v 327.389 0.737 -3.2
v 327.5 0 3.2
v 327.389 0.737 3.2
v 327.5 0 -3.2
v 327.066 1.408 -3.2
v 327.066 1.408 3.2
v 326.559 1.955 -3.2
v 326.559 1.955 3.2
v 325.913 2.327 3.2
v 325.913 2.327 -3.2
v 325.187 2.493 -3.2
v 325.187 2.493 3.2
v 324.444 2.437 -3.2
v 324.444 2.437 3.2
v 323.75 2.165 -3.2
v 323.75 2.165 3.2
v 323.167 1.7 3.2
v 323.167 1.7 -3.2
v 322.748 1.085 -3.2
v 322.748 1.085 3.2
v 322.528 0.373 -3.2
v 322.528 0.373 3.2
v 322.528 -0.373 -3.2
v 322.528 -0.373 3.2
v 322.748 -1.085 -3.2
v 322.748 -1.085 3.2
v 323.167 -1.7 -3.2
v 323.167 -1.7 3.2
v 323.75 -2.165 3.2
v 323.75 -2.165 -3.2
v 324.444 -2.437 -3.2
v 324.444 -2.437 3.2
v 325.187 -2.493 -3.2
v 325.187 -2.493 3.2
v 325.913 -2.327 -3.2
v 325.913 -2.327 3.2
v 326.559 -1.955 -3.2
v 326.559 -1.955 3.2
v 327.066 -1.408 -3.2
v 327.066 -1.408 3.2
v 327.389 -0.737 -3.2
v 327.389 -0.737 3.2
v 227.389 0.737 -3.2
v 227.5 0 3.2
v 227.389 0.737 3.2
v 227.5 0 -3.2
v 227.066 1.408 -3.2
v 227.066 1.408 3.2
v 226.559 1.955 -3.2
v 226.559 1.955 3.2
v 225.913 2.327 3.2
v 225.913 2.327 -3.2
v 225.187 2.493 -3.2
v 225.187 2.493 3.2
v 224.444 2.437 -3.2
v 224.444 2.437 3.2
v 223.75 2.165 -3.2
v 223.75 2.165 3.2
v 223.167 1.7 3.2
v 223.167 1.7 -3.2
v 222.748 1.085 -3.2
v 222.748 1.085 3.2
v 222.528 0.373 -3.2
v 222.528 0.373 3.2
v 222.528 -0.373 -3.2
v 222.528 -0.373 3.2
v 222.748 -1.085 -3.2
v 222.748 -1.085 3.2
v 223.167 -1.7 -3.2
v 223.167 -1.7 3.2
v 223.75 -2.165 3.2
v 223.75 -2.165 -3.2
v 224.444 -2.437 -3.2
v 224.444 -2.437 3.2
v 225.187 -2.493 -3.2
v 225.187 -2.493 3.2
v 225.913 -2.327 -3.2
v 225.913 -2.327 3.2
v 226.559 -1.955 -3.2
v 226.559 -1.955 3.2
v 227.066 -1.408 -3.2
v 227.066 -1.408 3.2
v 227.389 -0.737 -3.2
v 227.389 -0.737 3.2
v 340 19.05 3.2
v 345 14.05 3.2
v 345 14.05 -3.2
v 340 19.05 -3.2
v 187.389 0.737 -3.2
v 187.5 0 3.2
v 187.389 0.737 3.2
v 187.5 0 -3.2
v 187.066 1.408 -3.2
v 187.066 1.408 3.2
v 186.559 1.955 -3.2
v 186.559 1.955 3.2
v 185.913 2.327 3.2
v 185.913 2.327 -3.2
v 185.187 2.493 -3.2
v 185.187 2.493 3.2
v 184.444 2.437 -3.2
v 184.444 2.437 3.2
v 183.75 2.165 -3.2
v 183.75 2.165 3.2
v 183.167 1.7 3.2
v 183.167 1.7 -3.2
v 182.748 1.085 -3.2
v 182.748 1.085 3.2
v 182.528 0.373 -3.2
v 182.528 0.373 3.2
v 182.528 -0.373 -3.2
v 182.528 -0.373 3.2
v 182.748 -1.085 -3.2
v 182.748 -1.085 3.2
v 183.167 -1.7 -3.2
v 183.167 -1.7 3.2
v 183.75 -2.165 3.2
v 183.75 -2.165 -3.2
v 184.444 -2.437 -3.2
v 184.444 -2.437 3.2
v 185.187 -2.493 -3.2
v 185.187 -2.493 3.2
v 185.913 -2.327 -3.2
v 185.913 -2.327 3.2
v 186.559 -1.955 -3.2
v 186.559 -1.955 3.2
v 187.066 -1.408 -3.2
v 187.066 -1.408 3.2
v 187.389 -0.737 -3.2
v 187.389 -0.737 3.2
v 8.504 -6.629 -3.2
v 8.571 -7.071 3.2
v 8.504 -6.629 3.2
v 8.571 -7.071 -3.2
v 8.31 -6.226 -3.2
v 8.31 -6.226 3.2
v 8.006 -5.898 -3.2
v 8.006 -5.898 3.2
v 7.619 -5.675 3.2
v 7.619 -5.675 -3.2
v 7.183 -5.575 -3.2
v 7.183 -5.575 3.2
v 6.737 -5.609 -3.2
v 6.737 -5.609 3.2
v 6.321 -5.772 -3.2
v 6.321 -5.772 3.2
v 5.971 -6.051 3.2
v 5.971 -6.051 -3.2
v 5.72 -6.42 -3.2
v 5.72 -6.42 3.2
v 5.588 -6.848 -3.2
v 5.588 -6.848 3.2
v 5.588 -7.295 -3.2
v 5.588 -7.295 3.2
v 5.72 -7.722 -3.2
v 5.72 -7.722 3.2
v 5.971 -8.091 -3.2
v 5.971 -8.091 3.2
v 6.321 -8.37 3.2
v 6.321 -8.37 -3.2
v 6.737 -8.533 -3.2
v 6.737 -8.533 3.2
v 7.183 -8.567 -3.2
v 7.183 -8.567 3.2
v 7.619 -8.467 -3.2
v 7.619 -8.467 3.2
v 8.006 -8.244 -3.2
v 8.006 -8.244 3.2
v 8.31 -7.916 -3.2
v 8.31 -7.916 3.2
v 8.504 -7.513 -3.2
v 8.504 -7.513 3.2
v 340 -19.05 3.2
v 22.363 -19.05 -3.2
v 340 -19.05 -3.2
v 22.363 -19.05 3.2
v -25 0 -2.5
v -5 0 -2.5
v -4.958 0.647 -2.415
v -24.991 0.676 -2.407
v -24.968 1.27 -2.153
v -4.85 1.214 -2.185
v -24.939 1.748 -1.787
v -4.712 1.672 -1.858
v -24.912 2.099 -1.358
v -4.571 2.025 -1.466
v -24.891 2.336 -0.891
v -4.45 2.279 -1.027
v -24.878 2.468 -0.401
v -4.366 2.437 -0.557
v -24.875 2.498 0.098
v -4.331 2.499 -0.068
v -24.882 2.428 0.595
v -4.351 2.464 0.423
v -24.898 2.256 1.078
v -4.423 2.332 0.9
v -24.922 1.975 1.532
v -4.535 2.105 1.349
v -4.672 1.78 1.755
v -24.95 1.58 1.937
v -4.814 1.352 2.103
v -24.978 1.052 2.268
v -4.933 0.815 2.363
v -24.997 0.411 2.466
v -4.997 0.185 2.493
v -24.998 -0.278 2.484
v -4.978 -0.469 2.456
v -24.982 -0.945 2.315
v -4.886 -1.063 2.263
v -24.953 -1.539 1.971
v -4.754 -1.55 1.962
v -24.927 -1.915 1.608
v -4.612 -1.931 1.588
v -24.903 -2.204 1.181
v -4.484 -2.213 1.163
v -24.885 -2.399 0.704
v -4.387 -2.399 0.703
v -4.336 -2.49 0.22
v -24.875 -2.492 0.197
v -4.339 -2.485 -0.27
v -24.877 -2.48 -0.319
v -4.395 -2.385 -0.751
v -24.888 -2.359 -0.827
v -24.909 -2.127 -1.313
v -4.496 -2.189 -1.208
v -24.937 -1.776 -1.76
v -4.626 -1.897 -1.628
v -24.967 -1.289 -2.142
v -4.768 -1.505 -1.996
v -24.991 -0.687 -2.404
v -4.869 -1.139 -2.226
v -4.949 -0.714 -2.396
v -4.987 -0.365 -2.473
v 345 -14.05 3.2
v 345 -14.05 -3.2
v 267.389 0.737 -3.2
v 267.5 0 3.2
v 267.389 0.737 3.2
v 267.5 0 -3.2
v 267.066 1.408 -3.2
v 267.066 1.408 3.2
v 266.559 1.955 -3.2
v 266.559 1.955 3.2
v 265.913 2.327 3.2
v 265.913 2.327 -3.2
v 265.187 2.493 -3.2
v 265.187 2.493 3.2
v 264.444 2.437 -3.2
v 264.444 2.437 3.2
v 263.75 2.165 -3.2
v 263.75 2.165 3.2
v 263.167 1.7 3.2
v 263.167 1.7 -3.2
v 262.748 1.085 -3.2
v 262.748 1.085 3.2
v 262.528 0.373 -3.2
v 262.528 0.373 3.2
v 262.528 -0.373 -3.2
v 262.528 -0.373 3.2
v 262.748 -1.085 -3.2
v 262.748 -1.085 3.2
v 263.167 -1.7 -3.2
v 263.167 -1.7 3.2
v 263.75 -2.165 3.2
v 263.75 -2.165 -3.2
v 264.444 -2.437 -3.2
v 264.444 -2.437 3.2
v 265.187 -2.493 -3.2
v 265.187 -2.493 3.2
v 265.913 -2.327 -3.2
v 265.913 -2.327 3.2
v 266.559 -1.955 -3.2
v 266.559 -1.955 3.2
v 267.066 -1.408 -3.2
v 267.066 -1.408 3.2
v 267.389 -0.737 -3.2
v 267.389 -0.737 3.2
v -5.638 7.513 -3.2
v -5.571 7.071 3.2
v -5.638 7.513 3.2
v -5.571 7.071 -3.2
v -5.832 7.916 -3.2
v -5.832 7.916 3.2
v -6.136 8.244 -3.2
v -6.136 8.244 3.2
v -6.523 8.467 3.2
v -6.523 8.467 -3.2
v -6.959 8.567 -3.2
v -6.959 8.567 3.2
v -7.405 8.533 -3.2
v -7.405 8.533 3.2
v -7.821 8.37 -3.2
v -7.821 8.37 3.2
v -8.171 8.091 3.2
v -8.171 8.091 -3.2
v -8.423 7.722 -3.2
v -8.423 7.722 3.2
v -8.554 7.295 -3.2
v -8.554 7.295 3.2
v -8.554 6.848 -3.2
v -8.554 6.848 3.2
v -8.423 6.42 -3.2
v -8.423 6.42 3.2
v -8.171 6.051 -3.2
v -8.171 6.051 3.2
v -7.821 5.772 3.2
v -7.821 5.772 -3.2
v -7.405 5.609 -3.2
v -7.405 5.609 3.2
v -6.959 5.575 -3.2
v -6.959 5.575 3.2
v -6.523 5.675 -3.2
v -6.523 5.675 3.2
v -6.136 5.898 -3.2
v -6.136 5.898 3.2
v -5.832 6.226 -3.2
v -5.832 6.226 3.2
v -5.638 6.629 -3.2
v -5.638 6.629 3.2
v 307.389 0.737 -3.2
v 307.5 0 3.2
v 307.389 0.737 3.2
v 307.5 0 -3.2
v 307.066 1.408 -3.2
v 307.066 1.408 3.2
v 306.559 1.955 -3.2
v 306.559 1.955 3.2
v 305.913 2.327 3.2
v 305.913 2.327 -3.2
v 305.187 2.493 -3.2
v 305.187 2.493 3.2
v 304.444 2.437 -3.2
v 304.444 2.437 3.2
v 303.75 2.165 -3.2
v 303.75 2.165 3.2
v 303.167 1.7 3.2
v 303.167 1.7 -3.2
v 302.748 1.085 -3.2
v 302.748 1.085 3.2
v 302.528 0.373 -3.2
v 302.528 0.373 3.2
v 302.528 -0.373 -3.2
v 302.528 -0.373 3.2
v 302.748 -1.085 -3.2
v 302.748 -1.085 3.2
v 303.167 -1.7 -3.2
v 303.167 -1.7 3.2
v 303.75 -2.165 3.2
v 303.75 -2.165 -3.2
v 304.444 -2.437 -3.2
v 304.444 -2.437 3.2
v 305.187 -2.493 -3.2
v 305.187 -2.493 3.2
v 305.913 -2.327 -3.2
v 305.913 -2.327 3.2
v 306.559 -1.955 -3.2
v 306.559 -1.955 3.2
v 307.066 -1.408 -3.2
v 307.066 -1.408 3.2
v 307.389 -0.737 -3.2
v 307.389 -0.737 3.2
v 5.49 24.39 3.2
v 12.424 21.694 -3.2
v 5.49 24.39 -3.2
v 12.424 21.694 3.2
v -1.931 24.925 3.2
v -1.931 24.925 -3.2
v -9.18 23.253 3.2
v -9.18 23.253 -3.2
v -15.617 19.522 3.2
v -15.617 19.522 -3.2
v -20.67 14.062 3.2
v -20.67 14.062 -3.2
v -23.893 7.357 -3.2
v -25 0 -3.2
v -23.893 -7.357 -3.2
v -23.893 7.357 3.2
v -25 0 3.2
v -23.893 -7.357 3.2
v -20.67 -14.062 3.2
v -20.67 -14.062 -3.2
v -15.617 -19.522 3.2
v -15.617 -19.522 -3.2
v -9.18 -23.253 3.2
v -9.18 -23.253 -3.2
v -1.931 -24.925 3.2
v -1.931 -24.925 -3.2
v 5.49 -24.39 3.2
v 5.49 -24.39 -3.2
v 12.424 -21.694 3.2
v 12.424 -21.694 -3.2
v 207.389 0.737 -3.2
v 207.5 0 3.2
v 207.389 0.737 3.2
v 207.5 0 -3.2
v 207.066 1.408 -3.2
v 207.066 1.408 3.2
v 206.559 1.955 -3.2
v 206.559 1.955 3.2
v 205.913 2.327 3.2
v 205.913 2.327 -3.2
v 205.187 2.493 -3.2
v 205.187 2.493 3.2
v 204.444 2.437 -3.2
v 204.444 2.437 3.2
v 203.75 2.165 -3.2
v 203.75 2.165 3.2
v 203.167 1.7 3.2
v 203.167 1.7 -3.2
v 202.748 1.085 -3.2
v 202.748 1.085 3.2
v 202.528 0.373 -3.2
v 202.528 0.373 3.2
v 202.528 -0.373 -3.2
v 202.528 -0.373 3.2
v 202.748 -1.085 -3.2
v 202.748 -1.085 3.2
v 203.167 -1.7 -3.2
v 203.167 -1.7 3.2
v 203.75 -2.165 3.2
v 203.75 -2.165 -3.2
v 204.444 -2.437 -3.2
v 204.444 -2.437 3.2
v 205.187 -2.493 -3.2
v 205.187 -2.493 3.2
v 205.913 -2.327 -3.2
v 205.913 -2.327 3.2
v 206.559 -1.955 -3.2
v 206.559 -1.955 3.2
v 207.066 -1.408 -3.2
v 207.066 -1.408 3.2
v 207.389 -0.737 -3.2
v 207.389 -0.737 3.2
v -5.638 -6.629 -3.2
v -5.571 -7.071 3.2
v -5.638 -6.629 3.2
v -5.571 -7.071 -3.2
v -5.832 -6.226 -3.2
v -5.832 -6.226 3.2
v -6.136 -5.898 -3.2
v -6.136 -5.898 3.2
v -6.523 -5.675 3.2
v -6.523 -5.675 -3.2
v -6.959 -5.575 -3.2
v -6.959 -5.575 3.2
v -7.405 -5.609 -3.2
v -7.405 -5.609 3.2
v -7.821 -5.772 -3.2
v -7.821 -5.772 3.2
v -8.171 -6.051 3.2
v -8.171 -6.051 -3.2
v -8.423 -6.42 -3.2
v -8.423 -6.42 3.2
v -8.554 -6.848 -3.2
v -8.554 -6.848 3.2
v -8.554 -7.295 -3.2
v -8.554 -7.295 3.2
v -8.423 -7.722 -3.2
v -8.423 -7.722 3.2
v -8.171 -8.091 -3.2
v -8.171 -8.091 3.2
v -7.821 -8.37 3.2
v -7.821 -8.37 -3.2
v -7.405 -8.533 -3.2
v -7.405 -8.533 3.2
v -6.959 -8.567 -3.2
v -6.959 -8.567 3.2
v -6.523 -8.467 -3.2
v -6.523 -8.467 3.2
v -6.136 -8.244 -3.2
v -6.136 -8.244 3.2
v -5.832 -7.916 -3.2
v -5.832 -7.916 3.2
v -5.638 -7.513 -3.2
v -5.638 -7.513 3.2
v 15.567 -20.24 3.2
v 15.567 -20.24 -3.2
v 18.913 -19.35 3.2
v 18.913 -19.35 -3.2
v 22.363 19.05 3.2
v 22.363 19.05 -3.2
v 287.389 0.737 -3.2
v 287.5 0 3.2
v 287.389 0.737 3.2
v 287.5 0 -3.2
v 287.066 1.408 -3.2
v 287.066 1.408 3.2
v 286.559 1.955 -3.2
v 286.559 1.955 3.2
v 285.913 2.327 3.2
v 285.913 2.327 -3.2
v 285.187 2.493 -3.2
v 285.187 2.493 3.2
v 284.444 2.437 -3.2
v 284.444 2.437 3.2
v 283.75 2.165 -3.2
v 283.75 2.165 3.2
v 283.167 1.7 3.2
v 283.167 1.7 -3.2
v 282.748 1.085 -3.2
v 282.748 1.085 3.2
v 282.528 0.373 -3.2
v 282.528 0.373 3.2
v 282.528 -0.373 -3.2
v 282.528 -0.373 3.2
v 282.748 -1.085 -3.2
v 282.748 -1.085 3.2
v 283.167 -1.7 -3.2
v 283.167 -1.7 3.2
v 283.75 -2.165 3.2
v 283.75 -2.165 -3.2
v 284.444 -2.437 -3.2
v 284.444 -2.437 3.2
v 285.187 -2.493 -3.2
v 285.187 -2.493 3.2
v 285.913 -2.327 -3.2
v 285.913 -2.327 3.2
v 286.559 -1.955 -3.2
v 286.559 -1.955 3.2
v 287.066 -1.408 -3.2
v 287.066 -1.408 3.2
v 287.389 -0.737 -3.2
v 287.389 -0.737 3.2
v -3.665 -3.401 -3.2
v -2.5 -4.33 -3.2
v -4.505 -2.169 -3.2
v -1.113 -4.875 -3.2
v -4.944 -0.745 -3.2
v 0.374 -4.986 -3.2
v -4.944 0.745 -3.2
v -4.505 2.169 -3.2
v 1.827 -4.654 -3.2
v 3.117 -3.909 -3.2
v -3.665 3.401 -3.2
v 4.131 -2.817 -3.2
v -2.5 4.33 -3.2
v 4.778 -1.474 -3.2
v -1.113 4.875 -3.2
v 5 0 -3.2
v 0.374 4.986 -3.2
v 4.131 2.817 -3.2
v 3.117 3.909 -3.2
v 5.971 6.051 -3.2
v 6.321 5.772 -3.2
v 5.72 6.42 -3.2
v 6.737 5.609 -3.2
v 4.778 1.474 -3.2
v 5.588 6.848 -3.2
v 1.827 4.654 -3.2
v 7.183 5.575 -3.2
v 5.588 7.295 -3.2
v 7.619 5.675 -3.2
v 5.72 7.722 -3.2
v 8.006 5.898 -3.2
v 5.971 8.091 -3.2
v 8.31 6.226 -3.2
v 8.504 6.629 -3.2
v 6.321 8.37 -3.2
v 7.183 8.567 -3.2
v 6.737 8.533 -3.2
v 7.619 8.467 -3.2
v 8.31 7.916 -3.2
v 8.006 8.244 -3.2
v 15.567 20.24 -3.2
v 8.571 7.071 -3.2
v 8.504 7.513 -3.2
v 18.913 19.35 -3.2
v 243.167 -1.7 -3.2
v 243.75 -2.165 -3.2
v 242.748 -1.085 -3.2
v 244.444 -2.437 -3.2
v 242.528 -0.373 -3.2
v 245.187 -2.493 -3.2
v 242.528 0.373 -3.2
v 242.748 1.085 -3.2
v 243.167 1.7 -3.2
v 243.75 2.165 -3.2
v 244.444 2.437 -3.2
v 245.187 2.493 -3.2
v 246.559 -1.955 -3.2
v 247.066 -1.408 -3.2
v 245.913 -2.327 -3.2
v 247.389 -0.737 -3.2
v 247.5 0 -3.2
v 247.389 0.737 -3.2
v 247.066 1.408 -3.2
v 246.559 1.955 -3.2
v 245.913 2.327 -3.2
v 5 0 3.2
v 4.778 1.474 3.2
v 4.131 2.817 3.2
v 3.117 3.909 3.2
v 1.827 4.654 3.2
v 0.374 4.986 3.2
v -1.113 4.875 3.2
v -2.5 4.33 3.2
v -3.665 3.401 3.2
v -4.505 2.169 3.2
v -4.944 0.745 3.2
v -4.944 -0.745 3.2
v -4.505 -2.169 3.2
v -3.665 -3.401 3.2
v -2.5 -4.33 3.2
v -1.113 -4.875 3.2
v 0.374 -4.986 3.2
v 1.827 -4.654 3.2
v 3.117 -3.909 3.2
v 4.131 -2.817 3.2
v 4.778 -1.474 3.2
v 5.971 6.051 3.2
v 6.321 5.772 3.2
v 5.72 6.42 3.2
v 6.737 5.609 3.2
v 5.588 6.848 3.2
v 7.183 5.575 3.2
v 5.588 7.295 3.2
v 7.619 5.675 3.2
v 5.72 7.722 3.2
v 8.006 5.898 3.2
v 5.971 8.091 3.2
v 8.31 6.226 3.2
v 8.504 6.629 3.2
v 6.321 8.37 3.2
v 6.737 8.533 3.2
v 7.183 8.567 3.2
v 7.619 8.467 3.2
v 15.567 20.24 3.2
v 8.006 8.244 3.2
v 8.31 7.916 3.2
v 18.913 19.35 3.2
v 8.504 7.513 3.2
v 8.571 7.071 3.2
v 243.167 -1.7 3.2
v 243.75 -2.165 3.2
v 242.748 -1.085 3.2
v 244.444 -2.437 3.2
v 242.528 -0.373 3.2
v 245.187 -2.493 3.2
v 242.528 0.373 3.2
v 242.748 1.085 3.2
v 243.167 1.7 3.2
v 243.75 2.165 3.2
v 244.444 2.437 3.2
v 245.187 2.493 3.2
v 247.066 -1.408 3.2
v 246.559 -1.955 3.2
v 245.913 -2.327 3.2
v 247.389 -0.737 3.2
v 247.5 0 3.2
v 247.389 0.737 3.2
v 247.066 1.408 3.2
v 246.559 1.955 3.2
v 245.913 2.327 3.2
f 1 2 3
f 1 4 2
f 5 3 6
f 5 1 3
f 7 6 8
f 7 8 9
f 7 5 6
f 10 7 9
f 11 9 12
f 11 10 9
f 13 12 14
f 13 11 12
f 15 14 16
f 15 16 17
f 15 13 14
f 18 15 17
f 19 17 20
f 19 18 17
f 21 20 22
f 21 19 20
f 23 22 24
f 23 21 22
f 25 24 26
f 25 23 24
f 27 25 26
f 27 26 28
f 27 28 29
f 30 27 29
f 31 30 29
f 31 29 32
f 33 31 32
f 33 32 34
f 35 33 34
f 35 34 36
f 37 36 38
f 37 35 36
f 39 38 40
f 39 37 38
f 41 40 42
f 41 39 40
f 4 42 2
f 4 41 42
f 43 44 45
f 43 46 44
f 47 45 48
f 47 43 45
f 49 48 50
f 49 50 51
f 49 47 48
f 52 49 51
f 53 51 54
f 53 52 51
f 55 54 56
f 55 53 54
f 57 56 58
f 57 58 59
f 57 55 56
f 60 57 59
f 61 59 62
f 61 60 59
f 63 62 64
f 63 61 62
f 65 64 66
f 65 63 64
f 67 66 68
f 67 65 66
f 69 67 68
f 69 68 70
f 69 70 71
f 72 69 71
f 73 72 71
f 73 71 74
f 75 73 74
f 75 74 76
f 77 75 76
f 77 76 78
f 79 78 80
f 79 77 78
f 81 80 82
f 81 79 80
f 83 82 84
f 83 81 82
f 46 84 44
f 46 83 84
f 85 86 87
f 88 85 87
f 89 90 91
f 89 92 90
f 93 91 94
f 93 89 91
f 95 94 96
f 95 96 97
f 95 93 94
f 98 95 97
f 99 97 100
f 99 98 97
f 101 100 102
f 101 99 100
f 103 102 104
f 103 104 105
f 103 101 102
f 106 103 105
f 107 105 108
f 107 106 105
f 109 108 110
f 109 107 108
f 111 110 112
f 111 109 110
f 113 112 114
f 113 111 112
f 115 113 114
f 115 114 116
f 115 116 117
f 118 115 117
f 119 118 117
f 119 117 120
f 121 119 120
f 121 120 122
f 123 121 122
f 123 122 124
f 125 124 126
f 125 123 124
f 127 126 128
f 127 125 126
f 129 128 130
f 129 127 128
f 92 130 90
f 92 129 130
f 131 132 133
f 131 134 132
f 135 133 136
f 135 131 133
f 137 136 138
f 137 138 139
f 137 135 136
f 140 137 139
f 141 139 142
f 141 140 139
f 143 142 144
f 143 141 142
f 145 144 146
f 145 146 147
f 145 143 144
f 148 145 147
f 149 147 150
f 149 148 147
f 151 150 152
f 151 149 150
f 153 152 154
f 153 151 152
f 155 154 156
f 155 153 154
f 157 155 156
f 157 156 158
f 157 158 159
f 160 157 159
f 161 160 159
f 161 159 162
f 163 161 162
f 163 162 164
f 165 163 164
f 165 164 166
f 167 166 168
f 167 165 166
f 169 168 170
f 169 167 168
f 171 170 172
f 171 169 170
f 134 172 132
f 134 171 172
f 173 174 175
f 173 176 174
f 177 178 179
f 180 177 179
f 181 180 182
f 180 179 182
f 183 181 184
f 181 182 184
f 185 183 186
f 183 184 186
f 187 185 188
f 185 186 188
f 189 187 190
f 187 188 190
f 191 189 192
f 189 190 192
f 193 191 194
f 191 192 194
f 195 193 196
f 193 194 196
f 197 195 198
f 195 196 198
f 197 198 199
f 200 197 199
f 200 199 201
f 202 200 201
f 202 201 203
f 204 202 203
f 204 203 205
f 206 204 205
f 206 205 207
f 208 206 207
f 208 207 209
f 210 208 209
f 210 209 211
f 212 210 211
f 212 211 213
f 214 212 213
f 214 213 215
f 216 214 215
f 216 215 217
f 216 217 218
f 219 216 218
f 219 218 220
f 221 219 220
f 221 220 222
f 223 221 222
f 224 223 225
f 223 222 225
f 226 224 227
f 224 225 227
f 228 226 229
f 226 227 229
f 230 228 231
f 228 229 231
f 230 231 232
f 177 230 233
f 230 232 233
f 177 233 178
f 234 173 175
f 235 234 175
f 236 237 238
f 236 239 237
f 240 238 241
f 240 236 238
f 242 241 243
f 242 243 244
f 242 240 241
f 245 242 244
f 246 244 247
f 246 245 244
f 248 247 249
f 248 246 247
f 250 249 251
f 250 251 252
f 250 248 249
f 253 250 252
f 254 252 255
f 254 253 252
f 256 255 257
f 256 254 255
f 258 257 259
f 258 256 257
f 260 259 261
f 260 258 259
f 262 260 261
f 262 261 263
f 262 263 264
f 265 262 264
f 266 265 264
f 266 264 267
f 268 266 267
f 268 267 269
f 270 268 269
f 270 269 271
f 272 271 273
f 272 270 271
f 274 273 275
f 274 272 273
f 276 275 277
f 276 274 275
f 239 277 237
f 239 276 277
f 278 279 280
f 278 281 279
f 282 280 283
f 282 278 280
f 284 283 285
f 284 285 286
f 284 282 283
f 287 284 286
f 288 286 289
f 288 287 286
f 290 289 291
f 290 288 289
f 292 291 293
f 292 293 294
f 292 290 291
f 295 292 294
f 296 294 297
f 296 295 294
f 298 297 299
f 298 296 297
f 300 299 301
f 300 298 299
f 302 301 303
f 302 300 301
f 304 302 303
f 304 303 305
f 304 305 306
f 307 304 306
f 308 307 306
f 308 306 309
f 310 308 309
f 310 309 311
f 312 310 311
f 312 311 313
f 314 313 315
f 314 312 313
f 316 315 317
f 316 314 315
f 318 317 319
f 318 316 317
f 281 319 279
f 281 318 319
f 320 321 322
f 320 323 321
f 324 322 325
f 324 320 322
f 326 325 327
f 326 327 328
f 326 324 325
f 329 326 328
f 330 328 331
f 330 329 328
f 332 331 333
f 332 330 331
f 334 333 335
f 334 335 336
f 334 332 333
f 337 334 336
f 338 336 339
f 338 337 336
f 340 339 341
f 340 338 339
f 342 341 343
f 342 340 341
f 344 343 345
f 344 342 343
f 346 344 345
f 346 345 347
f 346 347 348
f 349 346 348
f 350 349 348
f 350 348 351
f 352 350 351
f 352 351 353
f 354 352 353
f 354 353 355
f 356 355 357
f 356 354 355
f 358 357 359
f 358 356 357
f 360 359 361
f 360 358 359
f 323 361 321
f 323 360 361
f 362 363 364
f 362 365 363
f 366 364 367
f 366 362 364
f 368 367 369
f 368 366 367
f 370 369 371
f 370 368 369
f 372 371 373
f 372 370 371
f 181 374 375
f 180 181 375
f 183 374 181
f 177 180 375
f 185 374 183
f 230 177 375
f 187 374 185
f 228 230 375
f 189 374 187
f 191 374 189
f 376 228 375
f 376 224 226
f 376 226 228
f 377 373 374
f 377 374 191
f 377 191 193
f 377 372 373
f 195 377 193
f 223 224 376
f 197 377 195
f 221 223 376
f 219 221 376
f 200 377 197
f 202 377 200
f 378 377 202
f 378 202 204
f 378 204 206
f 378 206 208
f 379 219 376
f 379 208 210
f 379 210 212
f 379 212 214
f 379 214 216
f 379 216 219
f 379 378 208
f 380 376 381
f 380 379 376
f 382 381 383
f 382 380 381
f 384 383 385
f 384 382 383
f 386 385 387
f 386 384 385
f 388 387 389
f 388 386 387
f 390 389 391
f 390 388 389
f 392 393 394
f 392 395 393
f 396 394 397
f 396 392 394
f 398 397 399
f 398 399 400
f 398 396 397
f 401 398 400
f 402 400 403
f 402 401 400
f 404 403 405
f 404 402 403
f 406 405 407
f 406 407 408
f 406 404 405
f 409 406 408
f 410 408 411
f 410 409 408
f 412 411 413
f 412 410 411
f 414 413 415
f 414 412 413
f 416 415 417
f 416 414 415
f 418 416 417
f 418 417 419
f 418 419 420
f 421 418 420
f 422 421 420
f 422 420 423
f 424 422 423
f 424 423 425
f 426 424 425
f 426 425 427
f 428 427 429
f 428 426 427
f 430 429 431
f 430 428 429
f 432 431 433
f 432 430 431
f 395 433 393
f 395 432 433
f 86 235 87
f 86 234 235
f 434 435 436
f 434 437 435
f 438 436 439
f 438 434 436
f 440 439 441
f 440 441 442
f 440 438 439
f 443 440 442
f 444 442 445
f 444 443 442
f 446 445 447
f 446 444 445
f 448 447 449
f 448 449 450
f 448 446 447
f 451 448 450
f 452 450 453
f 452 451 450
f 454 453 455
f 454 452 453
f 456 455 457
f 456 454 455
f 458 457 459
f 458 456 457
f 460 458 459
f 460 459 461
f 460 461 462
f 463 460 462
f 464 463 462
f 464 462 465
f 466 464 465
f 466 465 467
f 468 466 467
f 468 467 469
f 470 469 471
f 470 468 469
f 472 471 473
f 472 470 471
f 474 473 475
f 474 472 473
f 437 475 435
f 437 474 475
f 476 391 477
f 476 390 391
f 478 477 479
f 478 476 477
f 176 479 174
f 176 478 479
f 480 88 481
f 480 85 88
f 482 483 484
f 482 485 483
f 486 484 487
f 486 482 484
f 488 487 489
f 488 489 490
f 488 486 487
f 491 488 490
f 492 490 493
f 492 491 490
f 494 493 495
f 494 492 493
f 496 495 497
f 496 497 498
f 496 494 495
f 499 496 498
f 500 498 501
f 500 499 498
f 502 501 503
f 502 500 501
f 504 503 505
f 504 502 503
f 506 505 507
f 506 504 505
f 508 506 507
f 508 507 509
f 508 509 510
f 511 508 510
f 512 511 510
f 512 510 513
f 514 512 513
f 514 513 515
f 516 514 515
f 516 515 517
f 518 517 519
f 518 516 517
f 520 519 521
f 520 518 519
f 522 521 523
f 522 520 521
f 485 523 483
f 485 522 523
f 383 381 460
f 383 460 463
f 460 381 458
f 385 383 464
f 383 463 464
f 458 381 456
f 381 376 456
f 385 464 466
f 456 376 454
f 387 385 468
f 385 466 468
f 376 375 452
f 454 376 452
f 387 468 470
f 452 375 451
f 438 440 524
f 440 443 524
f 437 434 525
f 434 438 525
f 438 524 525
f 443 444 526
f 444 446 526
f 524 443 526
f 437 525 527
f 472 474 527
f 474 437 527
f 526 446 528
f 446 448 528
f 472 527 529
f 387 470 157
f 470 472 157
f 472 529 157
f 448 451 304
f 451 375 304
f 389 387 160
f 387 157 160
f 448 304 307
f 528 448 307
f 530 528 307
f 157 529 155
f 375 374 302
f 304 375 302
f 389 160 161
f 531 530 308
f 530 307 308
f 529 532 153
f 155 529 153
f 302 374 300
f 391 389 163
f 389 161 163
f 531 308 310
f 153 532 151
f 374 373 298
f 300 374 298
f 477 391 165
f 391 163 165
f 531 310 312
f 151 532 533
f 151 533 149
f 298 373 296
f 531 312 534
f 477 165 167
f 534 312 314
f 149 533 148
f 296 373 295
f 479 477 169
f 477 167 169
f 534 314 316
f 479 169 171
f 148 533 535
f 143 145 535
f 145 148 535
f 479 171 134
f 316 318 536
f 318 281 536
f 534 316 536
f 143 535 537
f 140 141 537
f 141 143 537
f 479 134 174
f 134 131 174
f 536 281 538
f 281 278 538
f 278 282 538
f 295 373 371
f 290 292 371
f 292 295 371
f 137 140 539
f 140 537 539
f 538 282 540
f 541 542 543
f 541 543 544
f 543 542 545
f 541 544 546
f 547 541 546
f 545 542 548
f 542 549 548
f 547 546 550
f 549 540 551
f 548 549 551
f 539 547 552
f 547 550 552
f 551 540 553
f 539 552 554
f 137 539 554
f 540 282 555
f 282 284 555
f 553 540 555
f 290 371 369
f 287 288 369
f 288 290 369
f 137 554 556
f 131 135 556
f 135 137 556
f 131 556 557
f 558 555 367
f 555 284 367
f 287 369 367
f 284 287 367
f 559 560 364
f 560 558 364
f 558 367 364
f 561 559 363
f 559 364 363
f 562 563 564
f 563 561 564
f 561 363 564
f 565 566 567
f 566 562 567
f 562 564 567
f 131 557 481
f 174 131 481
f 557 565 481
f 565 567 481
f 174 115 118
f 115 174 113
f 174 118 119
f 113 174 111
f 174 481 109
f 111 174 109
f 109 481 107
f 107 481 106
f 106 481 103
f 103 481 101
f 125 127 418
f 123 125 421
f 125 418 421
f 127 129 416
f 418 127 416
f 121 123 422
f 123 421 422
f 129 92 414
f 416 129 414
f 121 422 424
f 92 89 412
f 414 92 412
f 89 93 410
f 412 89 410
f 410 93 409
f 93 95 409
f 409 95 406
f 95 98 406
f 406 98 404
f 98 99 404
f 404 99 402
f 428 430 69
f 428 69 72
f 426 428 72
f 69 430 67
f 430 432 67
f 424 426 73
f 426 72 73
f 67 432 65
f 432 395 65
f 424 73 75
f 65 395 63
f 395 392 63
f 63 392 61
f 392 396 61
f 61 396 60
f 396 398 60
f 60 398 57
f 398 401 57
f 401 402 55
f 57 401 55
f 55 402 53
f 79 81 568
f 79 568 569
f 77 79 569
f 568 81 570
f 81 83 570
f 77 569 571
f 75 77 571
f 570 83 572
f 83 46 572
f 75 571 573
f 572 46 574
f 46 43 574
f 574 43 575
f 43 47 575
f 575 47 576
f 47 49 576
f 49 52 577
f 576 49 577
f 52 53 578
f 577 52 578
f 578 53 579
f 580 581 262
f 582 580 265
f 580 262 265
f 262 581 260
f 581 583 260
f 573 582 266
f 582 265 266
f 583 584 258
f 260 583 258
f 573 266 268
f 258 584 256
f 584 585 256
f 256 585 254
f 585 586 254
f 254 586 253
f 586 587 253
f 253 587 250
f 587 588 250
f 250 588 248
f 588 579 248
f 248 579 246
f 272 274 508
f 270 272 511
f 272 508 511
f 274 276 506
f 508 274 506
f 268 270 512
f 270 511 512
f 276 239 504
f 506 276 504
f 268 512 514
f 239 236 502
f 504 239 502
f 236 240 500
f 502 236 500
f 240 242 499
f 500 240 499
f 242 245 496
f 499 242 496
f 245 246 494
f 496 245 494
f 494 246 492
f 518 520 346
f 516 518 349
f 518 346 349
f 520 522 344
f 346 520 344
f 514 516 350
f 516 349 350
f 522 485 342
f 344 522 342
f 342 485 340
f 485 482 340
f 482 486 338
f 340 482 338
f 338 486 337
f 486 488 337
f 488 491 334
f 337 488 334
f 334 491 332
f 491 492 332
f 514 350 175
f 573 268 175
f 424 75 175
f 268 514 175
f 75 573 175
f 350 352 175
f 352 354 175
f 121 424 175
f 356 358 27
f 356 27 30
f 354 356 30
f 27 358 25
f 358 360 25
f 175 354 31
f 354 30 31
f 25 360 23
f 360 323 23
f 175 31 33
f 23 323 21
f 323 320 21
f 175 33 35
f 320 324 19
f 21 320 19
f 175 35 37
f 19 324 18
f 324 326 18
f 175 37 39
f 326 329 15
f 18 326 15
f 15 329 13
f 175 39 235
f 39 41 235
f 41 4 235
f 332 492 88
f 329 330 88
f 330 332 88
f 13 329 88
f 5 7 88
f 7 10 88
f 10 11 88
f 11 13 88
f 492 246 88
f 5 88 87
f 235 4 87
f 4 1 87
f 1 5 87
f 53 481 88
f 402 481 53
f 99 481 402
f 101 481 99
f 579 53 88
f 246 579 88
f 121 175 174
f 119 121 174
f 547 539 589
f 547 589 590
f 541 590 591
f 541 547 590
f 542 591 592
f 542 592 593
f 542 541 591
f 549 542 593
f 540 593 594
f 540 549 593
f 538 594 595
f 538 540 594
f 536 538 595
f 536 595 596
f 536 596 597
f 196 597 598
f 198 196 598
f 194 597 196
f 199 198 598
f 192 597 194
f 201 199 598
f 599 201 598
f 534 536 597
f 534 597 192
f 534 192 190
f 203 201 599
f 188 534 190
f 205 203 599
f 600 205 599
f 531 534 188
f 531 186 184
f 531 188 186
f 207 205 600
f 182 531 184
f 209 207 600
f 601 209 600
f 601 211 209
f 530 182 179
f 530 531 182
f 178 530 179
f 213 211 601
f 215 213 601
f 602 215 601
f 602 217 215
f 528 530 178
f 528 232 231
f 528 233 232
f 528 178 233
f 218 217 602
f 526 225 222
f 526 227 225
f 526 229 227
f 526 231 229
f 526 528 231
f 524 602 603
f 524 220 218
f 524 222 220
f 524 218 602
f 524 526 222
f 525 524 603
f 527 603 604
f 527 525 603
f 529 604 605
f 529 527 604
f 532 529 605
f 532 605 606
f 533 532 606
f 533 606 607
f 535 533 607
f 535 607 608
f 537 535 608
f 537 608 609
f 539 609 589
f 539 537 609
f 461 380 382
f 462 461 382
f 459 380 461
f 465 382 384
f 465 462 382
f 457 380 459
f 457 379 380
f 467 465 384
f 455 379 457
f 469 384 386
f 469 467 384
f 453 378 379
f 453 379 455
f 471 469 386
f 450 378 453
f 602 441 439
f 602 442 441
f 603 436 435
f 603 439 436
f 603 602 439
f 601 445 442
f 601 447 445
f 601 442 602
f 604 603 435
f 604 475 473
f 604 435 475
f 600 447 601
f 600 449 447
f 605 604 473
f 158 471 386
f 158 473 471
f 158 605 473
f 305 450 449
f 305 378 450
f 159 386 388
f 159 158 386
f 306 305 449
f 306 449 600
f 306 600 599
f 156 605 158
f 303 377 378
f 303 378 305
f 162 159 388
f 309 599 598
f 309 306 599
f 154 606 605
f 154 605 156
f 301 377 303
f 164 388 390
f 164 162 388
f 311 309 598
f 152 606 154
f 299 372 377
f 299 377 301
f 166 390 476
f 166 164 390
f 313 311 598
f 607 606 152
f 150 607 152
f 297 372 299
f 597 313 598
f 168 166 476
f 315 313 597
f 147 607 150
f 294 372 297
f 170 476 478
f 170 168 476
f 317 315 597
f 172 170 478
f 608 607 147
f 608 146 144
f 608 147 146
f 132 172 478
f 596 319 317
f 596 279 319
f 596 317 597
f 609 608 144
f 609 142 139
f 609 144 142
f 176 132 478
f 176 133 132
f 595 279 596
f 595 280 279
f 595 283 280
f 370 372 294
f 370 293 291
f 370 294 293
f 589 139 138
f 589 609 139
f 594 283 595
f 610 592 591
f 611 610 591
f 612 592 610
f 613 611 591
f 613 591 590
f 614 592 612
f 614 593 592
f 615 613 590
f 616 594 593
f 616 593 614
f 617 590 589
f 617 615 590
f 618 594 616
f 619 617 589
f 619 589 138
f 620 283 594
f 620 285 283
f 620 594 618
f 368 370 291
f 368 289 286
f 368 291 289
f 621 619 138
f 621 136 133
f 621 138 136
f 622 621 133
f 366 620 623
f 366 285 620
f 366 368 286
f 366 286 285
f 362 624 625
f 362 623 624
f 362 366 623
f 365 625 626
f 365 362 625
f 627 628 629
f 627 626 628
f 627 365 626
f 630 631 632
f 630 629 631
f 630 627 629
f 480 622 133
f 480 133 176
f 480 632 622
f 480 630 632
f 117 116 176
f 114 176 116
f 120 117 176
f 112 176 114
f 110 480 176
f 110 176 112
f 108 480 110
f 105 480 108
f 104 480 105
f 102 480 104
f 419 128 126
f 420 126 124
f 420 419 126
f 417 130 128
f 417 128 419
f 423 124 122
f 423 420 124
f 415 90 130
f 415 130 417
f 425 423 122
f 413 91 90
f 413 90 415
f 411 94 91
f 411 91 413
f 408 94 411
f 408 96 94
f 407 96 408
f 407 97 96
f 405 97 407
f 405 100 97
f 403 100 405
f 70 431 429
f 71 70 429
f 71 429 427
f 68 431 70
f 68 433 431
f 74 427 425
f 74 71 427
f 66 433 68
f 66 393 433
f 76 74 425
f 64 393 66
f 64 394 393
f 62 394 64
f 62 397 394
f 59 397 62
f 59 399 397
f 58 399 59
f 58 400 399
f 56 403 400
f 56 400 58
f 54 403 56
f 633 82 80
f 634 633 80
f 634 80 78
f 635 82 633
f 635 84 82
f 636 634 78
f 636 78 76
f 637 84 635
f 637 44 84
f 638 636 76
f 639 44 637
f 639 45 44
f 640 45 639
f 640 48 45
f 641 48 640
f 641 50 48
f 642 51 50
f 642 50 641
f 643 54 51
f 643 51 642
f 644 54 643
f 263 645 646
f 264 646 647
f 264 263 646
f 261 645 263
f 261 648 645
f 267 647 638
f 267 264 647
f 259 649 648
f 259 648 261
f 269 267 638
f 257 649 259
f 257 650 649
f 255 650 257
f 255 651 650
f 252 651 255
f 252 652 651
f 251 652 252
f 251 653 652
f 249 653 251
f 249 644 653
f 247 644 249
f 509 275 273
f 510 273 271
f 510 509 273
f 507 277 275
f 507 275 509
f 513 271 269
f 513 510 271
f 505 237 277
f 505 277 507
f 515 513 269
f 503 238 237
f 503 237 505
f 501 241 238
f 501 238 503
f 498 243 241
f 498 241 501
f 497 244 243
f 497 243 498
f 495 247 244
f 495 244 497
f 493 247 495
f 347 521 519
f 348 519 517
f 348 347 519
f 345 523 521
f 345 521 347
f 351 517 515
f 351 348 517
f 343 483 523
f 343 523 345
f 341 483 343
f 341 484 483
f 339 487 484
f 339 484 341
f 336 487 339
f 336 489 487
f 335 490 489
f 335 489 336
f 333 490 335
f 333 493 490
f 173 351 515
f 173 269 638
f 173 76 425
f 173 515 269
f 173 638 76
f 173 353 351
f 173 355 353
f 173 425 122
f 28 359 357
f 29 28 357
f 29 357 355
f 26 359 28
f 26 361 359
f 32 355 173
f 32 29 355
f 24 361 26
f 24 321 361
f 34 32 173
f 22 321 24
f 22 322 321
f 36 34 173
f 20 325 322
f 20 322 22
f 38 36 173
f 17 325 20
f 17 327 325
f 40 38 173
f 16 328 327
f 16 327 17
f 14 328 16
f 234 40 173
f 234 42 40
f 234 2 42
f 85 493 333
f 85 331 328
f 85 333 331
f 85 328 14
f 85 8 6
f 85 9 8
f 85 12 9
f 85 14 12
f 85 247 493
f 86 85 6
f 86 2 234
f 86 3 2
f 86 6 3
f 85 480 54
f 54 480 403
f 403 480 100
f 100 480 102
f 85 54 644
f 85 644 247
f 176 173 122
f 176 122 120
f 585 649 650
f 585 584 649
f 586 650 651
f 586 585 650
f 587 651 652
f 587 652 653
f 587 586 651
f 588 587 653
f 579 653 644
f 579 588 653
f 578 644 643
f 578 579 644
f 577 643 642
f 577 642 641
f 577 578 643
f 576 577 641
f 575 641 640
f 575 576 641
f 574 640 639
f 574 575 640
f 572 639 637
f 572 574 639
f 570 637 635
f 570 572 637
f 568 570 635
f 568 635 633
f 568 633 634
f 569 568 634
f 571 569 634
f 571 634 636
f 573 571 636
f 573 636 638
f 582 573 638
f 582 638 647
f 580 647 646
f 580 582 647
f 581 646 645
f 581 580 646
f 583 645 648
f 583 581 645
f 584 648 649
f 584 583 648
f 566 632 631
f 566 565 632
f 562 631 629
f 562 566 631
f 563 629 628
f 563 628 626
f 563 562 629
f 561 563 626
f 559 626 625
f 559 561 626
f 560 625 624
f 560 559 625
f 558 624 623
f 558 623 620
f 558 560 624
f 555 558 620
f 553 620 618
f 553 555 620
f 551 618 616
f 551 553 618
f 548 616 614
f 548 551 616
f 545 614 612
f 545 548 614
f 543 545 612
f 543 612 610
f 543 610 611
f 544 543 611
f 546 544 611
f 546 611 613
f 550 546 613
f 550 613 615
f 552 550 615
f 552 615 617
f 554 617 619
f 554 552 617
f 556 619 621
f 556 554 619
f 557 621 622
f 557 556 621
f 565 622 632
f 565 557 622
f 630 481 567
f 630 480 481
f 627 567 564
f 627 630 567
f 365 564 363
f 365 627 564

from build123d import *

# Parameters (mm, degrees)
SKETCH1_R           = 1.5
SKETCH1_R_2         = 2.5
SKETCH1_R_3         = 5
BOSS_EXTRUDE1_DEPTH = 3.2
SKETCH4_R           = 2.5
CUT_EXTRUDE1_DEPTH  = 32.4
FILLET1_R           = 20
CHAMFER1_SIZE       = 5


with BuildPart() as part:
    # Sketch1 → Boss-Extrude1 (new, symmetric)
    with BuildSketch(Plane.XY):
        with BuildLine():
            Line((345, 19.05), (16.189425561, 19.05))
            ThreePointArc((16.189425561, 19.05), (-25, 0), (16.189425561, -19.05))
            Line((16.189425561, -19.05), (345, -19.05))
            Line((345, -19.05), (345, 19.05))
        make_face()
        with Locations((7.071067812, 7.071067812)):
            Circle(SKETCH1_R, mode=Mode.SUBTRACT)
        with Locations((7.071067812, -7.071067812)):
            Circle(SKETCH1_R, mode=Mode.SUBTRACT)
        with Locations((-7.071067812, -7.071067812)):
            Circle(SKETCH1_R, mode=Mode.SUBTRACT)
        with Locations((-7.071067812, 7.071067812)):
            Circle(SKETCH1_R, mode=Mode.SUBTRACT)
        with Locations((325, 0)):
            Circle(SKETCH1_R_2, mode=Mode.SUBTRACT)
        with Locations((305, 0)):
            Circle(SKETCH1_R_2, mode=Mode.SUBTRACT)
        with Locations((285, 0)):
            Circle(SKETCH1_R_2, mode=Mode.SUBTRACT)
        with Locations((265, 0)):
            Circle(SKETCH1_R_2, mode=Mode.SUBTRACT)
        with Locations((245, 0)):
            Circle(SKETCH1_R_2, mode=Mode.SUBTRACT)
        with Locations((225, 0)):
            Circle(SKETCH1_R_2, mode=Mode.SUBTRACT)
        with Locations((205, 0)):
            Circle(SKETCH1_R_2, mode=Mode.SUBTRACT)
        with Locations((185, 0)):
            Circle(SKETCH1_R_2, mode=Mode.SUBTRACT)
        Circle(SKETCH1_R_3, mode=Mode.SUBTRACT)
    extrude(amount=BOSS_EXTRUDE1_DEPTH, both=True)

    # Sketch4 → Cut-Extrude1 (cut)
    with BuildSketch(Plane(origin=(0, 0, 0), x_dir=(0, 0, -1), z_dir=(1, 0, 0))):
        Circle(SKETCH4_R)
    extrude(amount=-CUT_EXTRUDE1_DEPTH, mode=Mode.SUBTRACT)

    # Fillet1
    fillet1_edges = [part.edges().sort_by_distance(p)[0] for p in [
        (16.189425561, -19.05, 0),
        (16.189425561, 19.05, 0),
    ]]
    fillet(fillet1_edges, radius=FILLET1_R)

    # Chamfer1
    chamfer1_edges = [part.edges().sort_by_distance(p)[0] for p in [
        (345, -19.05, 0),
        (345, 19.05, 0),
    ]]
    chamfer(chamfer1_edges, length=CHAMFER1_SIZE)


solid = part.part
